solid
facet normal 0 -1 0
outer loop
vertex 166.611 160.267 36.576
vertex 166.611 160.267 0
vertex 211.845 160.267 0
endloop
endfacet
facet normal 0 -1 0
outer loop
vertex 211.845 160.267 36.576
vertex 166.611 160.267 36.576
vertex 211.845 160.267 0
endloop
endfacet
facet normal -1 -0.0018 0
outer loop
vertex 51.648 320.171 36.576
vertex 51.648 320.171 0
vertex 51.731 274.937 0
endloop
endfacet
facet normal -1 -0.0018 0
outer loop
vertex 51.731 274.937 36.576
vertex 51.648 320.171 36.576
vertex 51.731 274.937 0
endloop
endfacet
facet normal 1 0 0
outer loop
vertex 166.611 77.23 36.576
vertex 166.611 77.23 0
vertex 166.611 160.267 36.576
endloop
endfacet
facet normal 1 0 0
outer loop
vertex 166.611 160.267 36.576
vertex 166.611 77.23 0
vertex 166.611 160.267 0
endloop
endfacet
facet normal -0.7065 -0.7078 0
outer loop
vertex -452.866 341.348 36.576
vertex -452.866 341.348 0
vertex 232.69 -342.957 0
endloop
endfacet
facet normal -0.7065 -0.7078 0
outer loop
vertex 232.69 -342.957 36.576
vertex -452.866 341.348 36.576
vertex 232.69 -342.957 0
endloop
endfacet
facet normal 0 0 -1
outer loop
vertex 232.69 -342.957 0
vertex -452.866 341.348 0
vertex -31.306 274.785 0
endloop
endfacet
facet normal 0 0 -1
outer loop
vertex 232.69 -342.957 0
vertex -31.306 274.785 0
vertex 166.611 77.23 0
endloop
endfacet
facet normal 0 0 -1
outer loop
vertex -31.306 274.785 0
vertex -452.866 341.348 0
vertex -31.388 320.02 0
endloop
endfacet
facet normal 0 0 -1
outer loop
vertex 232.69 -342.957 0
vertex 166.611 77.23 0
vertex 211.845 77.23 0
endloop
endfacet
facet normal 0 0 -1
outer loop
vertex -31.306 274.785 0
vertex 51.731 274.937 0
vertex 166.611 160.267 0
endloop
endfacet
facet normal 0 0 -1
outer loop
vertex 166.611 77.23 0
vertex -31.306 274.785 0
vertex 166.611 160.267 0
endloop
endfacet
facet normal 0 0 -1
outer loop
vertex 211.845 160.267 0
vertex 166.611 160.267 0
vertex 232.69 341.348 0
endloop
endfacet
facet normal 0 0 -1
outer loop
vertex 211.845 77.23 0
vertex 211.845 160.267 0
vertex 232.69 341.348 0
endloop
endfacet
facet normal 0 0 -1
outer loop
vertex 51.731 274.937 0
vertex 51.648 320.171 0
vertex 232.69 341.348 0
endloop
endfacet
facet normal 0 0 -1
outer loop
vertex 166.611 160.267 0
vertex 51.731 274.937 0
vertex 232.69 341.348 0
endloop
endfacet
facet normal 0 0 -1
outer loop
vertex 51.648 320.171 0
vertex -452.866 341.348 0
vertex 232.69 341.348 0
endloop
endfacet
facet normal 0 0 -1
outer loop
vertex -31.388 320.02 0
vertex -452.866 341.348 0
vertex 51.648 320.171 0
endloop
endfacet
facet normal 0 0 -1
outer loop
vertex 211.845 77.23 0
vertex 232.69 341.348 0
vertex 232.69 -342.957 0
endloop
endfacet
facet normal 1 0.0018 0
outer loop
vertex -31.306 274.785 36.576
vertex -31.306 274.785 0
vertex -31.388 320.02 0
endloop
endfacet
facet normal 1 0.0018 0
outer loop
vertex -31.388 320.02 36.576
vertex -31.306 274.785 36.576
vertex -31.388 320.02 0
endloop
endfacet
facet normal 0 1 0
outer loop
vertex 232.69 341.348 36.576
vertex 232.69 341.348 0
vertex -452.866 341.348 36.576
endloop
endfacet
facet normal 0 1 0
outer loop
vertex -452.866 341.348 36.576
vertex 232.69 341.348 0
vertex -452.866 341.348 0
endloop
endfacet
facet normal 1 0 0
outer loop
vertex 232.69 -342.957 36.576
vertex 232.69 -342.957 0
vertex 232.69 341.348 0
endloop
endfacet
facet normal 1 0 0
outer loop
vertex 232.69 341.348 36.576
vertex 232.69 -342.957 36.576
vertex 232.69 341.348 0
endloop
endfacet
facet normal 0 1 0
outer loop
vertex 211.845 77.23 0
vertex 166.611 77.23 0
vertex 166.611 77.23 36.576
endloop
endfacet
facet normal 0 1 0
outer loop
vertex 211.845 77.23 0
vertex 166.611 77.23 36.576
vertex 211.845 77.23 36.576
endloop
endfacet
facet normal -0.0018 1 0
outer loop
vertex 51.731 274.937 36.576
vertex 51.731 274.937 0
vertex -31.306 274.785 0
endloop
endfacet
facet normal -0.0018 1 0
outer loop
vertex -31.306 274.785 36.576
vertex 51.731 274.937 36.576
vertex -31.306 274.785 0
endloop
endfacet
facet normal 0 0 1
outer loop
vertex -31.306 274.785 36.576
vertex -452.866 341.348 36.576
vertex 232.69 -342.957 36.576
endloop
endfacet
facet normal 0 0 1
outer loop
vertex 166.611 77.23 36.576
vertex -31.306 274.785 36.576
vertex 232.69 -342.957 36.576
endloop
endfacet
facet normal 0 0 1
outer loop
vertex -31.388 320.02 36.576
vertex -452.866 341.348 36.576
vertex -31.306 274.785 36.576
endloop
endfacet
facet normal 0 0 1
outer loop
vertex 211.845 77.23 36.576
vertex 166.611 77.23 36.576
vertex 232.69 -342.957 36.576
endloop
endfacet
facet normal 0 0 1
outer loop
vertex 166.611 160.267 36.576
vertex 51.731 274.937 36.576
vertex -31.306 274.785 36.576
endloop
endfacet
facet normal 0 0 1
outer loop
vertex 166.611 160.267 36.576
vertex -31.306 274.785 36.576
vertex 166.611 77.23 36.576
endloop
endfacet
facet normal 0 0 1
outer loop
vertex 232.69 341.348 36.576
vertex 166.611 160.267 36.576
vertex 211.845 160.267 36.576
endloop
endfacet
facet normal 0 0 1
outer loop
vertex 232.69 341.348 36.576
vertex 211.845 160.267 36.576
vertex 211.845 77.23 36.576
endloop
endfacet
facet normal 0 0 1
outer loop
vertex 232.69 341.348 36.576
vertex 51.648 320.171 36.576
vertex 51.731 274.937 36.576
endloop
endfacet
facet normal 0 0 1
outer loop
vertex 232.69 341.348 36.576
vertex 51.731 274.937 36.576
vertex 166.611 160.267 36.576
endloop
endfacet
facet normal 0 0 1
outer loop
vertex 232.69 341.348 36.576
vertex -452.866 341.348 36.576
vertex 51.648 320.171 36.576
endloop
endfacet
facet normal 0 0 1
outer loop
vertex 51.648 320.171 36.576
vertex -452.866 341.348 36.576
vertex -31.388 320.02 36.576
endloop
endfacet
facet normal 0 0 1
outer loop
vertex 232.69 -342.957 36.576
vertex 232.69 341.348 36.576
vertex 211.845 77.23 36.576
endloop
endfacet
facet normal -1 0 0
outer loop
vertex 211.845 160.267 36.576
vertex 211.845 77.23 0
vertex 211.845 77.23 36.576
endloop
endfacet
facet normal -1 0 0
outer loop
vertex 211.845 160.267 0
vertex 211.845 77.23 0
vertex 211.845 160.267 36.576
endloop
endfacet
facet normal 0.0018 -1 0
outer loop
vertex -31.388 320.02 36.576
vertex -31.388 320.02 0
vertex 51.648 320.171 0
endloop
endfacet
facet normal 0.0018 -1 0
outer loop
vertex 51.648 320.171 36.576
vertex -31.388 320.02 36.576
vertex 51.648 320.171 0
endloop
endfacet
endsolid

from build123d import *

# Parameters (mm, degrees)
F0_W     = 45.234501
F0_H     = 83.036979
F1_DEPTH = 36.576
F2_DEPTH = 36.576


with BuildPart() as f1:
    # F0 (on Top) → F1 (new body)
    with BuildSketch(Plane.XY):
        Polygon((232.690369, 341.347511), (-452.865685, 341.347511), (232.690369, -342.956906), (232.690369, -171.880802), (232.690369, -0.804697), align=None)
        with Locations((189.227968, 118.748626)):
            Rectangle(F0_W, F0_H, mode=Mode.SUBTRACT)
        Polygon((-31.388473, 320.019749), (51.648368, 320.17149), (51.731029, 274.937065), (-31.305811, 274.785323), align=None, mode=Mode.SUBTRACT)
    extrude(amount=F1_DEPTH)

    # F0 (on Top) → F2 (join)
    with BuildSketch(Plane.XY):
        Polygon((232.690369, 341.347511), (-452.865685, 341.347511), (232.690369, -342.956906), (232.690369, -171.880802), (232.690369, -0.804697), align=None)
        with Locations((189.227968, 118.748626)):
            Rectangle(F0_W, F0_H, mode=Mode.SUBTRACT)
        Polygon((-31.388473, 320.019749), (51.648368, 320.17149), (51.731029, 274.937065), (-31.305811, 274.785323), align=None, mode=Mode.SUBTRACT)
    extrude(amount=F2_DEPTH)


solid = f1.part
